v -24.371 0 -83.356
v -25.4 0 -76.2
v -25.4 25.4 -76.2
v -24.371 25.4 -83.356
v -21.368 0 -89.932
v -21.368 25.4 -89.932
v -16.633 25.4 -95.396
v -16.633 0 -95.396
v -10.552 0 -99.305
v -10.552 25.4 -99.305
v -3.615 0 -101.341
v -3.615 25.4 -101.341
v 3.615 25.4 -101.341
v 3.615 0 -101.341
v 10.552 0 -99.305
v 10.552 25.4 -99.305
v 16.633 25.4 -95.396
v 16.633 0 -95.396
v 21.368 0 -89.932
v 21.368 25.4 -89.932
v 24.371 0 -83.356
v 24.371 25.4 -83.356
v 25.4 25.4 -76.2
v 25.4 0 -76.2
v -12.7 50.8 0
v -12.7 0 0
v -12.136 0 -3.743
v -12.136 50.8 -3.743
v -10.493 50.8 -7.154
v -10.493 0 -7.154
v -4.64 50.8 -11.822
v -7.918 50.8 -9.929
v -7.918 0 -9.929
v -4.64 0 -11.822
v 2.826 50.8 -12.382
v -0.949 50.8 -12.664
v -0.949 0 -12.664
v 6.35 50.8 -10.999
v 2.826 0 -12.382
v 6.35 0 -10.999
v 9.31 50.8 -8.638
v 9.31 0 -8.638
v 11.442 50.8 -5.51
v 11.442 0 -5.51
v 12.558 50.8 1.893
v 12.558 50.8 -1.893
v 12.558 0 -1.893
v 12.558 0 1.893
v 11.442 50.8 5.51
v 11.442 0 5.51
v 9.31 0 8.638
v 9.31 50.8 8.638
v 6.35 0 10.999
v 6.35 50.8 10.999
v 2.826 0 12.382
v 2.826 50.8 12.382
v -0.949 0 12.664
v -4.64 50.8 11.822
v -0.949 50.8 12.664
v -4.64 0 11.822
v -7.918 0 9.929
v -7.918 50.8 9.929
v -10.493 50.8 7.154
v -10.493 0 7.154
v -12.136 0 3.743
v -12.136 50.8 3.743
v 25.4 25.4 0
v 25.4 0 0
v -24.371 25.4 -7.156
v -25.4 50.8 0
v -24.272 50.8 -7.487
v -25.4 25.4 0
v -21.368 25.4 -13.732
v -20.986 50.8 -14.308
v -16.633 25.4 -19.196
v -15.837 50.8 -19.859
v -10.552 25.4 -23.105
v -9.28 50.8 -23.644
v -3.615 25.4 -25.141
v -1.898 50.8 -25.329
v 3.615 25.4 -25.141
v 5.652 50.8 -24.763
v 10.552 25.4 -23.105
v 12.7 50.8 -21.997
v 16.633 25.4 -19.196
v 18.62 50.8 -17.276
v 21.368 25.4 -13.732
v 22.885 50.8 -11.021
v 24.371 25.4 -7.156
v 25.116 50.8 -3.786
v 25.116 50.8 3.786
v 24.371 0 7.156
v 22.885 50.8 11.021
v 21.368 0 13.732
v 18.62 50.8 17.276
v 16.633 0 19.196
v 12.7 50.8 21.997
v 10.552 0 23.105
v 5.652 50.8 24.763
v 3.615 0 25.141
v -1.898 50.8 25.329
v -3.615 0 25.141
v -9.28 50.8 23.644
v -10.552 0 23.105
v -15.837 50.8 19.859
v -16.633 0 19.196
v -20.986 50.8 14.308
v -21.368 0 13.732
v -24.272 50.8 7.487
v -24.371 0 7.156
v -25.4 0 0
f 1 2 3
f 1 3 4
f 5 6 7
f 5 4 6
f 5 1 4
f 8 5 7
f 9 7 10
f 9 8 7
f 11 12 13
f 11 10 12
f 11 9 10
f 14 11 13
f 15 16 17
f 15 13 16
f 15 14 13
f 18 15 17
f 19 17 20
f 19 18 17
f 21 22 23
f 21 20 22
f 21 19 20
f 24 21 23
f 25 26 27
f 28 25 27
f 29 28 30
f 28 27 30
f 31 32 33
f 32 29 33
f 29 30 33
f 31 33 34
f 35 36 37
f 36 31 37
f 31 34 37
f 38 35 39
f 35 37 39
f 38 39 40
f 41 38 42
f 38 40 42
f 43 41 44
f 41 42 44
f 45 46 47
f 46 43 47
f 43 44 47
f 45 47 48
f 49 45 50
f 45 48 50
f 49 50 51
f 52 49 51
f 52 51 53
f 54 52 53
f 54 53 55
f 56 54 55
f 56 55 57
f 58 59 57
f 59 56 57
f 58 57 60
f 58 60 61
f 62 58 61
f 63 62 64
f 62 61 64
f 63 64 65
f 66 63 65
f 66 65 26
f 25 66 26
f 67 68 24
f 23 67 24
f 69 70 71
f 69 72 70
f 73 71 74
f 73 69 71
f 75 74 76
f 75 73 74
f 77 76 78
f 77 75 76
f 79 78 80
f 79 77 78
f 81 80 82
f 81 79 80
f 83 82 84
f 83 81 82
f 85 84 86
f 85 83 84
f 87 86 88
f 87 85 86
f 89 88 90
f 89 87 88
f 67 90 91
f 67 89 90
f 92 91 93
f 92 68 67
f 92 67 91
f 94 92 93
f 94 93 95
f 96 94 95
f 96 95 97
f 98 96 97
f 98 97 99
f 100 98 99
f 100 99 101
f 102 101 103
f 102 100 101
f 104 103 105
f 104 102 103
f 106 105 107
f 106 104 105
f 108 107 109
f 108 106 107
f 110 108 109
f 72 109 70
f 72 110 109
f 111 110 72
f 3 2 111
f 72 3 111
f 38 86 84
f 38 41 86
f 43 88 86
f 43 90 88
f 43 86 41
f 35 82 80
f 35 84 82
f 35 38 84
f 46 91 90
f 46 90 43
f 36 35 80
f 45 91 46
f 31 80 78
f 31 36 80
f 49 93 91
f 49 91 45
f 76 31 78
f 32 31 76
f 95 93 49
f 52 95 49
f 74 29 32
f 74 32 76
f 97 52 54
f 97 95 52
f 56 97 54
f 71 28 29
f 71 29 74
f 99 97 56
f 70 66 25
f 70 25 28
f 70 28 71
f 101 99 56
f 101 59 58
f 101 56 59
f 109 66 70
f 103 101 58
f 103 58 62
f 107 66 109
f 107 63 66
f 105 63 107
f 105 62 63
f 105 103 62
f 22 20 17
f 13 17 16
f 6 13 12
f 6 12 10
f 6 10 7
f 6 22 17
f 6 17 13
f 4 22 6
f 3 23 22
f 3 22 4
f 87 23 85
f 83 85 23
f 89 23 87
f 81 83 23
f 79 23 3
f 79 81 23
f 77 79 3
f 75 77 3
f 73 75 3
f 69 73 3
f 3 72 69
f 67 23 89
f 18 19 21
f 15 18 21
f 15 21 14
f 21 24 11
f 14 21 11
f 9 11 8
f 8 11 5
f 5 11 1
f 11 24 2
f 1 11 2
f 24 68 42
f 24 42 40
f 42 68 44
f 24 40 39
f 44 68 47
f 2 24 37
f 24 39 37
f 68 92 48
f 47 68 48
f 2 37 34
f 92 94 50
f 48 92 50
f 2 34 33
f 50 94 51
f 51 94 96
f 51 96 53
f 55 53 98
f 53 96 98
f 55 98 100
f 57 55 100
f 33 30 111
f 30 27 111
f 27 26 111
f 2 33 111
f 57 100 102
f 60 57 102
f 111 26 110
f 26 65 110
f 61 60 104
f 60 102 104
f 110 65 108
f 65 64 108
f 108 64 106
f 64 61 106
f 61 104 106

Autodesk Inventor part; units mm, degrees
ref_plane "YZ Plane" through (0, 0, 0) normal (1, 0, 0) x (0, 1, 0)
ref_plane "XZ Plane" through (0, 0, 0) normal (0, 1, 0) x (-1, 0, 0)
ref_plane "XY Plane" through (0, 0, 0) normal (0, 0, 1) x (1, 0, 0)
sketch "Sketch1" plane through (0, 0, 0) normal (0, 1, 0) x (-1, 0, 0)
  circle A0 centre (0, 0) radius 25.4
  line L0 (-25.4, 0) -> (-25.4, -76.2)
  line L1 (25.4, -76.2) -> (25.4, 0)
  arc A1 (-25.4, -76.2) -> (25.4, -76.2) centre (0, -76.2) ccw
  circle A2 centre (0, 0) radius 12.7
  dimension "d0" = 50.8
  dimension "d1" = 76.2
  dimension "d2" = 50.8
  dimension "d3" = 25.4
extrude "Extrusion1" add sketch "Sketch1" along normal blind 25.4 contours L1 A1 L0 A0
extrude "Extrusion2" add sketch "Sketch1" along normal blind 50.8 contours A0
properties part number "10-18-19 D"
